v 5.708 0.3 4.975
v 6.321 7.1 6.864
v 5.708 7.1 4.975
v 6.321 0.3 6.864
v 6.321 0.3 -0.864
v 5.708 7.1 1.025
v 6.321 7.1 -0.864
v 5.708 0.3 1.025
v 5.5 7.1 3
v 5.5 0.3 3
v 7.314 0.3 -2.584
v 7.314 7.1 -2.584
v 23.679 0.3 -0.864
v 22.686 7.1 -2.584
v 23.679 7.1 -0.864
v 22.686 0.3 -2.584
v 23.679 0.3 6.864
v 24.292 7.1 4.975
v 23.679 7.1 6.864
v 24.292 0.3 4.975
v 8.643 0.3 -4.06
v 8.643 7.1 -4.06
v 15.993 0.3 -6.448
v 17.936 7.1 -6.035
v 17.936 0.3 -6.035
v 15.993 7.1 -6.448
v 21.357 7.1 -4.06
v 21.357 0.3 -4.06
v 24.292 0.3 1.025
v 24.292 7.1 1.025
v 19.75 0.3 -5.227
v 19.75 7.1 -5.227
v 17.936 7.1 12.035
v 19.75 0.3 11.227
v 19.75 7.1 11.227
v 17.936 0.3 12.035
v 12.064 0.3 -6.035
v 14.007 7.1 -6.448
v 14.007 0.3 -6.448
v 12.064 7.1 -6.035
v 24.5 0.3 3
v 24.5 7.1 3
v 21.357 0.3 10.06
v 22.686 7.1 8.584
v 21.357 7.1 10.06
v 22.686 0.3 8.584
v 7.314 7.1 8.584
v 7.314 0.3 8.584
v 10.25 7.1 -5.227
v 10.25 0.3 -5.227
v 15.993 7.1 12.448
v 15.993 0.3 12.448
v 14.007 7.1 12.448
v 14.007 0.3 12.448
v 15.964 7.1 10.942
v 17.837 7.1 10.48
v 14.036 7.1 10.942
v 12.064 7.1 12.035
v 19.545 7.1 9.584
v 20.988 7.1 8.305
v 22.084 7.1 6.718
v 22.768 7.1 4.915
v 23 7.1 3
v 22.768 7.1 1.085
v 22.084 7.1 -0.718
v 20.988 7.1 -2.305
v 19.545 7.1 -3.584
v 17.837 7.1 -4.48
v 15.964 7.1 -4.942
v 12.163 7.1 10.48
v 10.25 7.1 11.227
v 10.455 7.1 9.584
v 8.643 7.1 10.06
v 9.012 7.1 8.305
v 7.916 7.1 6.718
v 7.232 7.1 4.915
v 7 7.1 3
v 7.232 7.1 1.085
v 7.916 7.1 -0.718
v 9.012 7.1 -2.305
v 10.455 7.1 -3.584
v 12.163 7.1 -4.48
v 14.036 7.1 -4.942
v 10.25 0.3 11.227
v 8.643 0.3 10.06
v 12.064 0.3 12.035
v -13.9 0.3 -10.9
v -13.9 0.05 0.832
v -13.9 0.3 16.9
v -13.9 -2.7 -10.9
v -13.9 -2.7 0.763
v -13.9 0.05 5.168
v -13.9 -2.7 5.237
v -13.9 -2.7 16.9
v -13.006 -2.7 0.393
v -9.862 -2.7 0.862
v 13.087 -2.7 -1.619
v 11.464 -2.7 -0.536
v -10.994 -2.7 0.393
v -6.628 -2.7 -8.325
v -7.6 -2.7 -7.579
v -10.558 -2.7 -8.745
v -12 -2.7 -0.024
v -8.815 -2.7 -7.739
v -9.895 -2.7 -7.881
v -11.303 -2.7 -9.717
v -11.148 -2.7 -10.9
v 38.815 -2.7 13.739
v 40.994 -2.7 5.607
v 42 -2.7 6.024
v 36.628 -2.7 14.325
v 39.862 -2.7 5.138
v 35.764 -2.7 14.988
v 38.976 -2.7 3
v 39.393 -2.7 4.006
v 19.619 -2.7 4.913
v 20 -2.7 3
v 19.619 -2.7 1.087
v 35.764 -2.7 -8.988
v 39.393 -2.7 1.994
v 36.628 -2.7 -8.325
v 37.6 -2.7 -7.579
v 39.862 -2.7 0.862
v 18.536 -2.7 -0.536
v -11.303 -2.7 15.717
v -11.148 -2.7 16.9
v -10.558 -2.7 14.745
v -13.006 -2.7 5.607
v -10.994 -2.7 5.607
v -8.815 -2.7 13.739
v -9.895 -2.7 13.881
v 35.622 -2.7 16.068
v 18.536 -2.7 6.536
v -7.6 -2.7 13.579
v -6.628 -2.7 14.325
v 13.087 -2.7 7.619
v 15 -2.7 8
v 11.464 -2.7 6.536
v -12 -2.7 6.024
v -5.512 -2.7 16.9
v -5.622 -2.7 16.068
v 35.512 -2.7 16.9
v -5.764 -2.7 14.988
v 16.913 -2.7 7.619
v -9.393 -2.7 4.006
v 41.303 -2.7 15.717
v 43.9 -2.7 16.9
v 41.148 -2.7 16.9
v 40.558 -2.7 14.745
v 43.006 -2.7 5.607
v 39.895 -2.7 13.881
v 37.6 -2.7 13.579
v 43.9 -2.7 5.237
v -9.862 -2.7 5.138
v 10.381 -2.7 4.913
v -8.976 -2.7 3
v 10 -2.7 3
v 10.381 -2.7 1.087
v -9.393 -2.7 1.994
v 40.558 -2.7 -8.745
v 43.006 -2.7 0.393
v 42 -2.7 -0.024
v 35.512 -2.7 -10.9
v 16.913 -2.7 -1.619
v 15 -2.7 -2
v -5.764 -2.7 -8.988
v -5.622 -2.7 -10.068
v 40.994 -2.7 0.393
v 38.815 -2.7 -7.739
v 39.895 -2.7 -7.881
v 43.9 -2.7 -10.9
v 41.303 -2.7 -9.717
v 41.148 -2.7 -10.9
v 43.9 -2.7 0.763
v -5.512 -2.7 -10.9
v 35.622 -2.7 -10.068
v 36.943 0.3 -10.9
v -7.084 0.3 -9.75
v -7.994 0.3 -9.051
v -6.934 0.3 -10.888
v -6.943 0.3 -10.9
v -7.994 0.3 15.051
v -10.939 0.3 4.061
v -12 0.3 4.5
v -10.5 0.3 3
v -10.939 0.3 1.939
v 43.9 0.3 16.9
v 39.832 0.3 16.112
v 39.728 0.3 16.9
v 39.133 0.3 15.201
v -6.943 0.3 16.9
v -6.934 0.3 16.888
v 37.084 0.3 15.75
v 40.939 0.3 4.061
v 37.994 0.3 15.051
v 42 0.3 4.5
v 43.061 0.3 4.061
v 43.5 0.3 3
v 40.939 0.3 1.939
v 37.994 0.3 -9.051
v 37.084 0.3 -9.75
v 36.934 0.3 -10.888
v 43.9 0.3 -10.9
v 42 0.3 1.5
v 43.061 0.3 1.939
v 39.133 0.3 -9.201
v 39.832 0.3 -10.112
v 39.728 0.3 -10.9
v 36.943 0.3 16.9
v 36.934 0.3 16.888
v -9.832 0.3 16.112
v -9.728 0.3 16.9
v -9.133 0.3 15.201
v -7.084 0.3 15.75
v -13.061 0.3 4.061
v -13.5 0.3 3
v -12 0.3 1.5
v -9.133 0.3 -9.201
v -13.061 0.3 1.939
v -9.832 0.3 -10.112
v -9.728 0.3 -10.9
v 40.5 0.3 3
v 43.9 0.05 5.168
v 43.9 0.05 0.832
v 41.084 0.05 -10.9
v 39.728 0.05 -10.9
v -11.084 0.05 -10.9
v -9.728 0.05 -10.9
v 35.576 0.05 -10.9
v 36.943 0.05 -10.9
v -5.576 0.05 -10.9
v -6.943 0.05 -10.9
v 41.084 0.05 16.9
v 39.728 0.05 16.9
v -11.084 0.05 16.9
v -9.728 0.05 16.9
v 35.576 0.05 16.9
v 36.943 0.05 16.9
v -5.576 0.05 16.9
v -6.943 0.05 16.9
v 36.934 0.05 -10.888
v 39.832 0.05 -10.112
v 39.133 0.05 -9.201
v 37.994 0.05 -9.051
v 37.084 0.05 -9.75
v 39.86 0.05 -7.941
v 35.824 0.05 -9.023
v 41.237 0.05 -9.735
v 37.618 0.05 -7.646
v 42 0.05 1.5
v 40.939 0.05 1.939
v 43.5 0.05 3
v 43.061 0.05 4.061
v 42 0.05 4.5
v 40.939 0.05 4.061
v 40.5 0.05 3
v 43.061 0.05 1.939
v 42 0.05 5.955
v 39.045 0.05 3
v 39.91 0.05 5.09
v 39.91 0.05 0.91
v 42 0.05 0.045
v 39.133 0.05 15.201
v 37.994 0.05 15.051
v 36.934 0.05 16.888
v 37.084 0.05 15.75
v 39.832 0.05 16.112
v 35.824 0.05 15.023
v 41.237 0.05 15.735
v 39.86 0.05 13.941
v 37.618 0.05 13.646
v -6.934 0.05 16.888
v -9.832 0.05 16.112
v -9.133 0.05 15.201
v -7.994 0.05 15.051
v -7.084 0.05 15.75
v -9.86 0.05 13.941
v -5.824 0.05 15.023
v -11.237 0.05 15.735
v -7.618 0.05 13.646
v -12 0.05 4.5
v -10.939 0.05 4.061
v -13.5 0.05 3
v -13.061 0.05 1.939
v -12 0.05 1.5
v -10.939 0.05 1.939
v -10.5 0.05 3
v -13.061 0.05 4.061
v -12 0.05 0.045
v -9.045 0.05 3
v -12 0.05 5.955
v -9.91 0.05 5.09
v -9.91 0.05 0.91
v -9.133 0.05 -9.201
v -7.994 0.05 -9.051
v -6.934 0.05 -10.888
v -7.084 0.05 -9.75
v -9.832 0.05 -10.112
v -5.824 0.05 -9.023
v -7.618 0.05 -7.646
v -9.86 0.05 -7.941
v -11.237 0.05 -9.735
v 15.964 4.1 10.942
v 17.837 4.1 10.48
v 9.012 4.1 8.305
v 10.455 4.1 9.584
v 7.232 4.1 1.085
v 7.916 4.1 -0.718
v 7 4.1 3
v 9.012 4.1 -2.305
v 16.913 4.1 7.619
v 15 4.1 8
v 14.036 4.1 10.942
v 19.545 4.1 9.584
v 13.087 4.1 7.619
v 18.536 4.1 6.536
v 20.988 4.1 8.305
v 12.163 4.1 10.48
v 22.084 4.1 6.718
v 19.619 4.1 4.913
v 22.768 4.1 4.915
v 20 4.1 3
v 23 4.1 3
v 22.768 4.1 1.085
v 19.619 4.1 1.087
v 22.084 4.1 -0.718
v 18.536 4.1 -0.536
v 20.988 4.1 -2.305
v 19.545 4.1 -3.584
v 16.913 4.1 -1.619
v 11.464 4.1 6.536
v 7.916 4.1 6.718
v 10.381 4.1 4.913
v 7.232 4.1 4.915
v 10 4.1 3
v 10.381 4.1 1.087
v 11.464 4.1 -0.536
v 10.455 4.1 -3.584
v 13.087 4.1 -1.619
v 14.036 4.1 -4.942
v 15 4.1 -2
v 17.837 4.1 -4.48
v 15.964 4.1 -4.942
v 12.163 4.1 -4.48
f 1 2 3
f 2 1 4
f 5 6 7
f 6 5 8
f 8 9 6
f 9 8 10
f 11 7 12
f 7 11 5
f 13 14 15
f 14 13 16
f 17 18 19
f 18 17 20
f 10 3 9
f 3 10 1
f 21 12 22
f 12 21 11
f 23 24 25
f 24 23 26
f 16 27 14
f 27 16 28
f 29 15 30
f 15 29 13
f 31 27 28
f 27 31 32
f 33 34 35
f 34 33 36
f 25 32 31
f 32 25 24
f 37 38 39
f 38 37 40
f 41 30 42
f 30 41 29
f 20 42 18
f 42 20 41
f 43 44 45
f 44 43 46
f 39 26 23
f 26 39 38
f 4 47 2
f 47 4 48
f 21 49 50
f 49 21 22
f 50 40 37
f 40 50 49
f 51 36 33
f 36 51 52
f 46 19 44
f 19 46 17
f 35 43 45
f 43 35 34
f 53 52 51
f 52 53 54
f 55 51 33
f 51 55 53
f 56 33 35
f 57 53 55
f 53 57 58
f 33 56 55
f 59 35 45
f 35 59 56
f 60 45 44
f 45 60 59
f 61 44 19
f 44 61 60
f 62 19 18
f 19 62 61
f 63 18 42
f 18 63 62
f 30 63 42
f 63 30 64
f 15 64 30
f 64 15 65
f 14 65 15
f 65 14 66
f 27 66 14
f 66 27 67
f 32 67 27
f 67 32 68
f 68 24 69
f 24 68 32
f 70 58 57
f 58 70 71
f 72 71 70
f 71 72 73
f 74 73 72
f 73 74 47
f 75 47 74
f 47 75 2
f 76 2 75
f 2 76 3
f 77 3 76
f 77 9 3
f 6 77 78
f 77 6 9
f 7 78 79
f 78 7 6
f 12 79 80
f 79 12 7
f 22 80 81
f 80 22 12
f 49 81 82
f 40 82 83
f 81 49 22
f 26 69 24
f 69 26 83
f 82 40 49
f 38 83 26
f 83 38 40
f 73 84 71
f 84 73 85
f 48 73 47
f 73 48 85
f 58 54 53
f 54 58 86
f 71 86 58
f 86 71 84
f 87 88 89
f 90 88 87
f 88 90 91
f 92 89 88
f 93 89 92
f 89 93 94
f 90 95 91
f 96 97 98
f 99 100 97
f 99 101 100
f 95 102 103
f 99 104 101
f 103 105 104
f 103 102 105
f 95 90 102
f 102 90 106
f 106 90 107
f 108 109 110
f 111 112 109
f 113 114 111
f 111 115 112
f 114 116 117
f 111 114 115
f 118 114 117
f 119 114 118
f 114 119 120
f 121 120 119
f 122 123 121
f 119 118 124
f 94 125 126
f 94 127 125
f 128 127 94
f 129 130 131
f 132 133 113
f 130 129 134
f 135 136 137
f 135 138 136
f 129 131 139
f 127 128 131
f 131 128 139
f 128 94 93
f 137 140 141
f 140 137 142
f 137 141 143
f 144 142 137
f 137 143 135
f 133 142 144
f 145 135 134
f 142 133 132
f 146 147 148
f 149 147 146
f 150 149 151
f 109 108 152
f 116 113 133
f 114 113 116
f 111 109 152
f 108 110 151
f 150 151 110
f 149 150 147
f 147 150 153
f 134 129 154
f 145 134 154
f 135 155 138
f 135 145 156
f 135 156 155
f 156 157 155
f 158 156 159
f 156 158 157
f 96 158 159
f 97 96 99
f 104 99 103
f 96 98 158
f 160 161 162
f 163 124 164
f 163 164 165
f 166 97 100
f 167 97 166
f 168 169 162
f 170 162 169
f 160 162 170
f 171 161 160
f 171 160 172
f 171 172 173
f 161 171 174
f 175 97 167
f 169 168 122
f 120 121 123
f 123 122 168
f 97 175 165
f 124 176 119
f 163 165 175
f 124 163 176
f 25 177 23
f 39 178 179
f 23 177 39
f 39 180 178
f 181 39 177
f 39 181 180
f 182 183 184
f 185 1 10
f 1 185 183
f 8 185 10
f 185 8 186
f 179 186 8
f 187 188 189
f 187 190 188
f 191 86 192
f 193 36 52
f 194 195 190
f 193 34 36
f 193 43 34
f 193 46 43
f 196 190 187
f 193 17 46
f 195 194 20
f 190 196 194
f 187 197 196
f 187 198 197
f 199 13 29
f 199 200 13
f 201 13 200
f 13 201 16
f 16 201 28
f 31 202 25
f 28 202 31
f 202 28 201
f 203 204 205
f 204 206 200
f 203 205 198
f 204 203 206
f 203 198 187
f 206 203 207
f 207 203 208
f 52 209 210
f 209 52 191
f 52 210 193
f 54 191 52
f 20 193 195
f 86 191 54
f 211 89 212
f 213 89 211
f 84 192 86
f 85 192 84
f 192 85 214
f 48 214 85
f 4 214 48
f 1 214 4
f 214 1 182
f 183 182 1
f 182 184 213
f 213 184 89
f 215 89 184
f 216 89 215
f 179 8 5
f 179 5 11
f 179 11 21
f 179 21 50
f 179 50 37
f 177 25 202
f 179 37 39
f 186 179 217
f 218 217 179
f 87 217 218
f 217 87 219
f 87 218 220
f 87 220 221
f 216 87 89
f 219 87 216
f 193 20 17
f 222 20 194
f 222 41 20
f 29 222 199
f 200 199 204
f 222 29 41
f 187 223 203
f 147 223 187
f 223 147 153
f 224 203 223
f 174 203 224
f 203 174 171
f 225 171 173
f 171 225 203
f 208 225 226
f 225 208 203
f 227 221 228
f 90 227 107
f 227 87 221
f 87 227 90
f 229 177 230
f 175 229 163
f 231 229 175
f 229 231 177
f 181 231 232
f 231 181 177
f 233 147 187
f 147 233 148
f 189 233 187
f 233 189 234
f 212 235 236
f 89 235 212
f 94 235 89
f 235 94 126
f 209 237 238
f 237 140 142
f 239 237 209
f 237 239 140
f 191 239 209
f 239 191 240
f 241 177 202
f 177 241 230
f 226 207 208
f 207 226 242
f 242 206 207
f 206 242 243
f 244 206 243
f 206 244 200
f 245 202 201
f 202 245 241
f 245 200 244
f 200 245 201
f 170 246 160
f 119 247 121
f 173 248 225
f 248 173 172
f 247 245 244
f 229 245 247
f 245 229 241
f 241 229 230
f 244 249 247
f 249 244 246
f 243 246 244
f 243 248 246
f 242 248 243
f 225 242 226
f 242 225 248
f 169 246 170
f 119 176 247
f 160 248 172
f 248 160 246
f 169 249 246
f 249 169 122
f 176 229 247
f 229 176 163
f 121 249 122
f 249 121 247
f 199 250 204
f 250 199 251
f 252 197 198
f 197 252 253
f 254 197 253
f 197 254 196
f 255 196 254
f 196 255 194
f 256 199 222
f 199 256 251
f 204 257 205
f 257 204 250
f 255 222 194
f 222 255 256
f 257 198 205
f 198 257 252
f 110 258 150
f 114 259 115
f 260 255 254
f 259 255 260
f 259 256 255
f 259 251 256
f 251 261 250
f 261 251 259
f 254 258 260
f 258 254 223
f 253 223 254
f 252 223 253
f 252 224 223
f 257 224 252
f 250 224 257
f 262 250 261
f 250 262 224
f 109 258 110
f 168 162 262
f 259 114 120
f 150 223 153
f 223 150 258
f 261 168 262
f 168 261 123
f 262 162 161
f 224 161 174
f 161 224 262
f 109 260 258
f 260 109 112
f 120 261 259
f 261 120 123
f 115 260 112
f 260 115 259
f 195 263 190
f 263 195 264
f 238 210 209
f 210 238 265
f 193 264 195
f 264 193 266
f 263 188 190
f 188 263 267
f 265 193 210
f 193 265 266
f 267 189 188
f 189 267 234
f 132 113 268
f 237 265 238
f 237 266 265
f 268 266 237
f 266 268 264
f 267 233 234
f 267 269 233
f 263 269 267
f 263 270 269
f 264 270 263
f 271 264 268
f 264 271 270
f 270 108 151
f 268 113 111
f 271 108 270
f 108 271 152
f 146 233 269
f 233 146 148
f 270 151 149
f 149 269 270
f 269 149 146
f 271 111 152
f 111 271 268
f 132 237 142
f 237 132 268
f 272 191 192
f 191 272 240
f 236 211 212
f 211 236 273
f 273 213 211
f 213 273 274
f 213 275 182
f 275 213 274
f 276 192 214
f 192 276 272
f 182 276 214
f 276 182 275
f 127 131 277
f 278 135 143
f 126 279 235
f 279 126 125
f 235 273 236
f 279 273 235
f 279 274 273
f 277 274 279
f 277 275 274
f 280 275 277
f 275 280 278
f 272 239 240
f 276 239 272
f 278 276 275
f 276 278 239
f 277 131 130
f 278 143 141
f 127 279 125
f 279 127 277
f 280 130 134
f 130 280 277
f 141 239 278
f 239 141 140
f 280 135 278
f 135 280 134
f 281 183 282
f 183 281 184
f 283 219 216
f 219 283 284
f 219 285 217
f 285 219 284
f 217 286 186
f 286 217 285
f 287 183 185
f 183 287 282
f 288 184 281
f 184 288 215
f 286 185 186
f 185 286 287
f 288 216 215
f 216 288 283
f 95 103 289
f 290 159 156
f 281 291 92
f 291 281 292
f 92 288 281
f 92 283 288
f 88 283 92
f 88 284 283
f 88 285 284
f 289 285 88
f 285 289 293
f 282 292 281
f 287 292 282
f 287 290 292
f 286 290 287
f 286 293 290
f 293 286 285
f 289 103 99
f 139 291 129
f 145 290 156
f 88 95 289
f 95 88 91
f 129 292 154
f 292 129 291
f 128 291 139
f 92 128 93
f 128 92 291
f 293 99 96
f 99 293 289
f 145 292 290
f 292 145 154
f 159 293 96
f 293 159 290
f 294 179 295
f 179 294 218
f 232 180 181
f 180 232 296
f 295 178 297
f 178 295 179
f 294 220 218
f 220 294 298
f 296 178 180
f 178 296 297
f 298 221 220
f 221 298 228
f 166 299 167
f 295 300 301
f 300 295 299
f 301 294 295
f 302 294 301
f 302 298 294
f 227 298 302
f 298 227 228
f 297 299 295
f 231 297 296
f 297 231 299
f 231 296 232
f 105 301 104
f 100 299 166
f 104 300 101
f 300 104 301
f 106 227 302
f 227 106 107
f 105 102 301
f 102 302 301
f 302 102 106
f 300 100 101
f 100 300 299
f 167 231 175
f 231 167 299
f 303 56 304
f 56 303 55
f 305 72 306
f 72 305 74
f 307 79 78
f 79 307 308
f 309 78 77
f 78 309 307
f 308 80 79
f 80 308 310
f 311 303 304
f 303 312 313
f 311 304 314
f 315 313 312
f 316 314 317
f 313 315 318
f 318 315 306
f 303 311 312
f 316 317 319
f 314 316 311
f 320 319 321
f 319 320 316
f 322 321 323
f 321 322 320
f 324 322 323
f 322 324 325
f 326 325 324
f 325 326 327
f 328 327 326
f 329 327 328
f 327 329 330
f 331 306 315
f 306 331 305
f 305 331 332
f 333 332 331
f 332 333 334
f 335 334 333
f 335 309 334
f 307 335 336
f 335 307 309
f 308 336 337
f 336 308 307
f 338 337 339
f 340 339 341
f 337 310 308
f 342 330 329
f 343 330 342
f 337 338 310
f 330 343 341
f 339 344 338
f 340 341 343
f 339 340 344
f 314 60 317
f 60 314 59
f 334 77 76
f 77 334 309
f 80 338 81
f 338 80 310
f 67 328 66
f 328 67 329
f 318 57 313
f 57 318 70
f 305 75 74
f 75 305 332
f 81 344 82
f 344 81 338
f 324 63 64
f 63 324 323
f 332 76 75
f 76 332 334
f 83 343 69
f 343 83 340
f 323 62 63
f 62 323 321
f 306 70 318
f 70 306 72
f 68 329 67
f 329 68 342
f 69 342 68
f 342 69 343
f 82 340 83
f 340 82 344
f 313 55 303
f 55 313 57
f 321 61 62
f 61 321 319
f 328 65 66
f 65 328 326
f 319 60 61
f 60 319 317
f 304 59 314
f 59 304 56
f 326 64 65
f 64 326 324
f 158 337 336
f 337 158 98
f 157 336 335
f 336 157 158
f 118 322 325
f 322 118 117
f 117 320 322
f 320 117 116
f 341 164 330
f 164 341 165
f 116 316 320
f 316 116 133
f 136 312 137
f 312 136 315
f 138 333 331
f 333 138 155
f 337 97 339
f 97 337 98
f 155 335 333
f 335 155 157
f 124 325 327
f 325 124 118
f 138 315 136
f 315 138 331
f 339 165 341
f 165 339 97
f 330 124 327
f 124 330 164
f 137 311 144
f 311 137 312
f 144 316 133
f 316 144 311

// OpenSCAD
fudge = 0.2;
plate_width = 58;
plate_depth = 28;
plate_height = 6;
top_diameter = 16;
grovemount_diameter = 12;
mount_hole_width = 54;
mount_hole_dia = 3;
translate([15,10,3])
rotate([90,180,0])

good_holder();


difference(){
//import("bowden_v1.4_E3D_V6.stl");
//mount_holes();

}

module cap_bolt_boolean(dia,len,fn=8)
{
	e=1.87*dia;
	h1=2*dia;
	cylinder(r=dia/2,h=len,$fn=fn);
	translate([0,0,-h1+0.05]) cylinder(r2=e/2+0.15,r1=e/2+0.3,h=h1,$fn=fn);
}

module main_plate()
{
  cube([plate_width-fudge,plate_depth-fudge,plate_height-fudge], center=true);
}

module mount_holes()
{
for (a = [0:30:360]) rotate([0, 0, a]) {
		translate([0, 27, 10]) rotate([0, 180, 0])
		 cap_bolt_boolean(3, 20);
	 }  


//translate([mount_hole_width/2,0,0])
//   cylinder(d=mount_hole_dia+fudge, h=plate_height+100, center=true);
//  translate([mount_hole_width/-2,0,0])
//   cylinder(d=mount_hole_dia+fudge, h=plate_height+100, center=true);
}
module grove_mount()
{
cylinder(d=grovemount_diameter+fudge, h=plate_height+1, center=true);
translate([0,plate_depth/2-grovemount_diameter/2,0])
cube([grovemount_diameter+fudge,plate_depth/2+1,plate_height+1], center=true);

}


module good_holder()
{
difference(){
union(){
translate([0,0,(plate_height/2)-(fudge/2)+3.5])
cylinder(d=top_diameter+3,h=7, center=true);
translate([0,0,11.2])
cube([plate_width-fudge,plate_depth-fudge,3], center=true);
}
mount_holes();

translate([0,0,4.4])
cylinder(d=top_diameter,h=3, center=true);
translate([0,0,(plate_height/2)-(fudge/2)+2])
cylinder(d=10,h=50, center=true);

}
}






*difference(){
main_plate();
mount_holes();
grove_mount();
};
